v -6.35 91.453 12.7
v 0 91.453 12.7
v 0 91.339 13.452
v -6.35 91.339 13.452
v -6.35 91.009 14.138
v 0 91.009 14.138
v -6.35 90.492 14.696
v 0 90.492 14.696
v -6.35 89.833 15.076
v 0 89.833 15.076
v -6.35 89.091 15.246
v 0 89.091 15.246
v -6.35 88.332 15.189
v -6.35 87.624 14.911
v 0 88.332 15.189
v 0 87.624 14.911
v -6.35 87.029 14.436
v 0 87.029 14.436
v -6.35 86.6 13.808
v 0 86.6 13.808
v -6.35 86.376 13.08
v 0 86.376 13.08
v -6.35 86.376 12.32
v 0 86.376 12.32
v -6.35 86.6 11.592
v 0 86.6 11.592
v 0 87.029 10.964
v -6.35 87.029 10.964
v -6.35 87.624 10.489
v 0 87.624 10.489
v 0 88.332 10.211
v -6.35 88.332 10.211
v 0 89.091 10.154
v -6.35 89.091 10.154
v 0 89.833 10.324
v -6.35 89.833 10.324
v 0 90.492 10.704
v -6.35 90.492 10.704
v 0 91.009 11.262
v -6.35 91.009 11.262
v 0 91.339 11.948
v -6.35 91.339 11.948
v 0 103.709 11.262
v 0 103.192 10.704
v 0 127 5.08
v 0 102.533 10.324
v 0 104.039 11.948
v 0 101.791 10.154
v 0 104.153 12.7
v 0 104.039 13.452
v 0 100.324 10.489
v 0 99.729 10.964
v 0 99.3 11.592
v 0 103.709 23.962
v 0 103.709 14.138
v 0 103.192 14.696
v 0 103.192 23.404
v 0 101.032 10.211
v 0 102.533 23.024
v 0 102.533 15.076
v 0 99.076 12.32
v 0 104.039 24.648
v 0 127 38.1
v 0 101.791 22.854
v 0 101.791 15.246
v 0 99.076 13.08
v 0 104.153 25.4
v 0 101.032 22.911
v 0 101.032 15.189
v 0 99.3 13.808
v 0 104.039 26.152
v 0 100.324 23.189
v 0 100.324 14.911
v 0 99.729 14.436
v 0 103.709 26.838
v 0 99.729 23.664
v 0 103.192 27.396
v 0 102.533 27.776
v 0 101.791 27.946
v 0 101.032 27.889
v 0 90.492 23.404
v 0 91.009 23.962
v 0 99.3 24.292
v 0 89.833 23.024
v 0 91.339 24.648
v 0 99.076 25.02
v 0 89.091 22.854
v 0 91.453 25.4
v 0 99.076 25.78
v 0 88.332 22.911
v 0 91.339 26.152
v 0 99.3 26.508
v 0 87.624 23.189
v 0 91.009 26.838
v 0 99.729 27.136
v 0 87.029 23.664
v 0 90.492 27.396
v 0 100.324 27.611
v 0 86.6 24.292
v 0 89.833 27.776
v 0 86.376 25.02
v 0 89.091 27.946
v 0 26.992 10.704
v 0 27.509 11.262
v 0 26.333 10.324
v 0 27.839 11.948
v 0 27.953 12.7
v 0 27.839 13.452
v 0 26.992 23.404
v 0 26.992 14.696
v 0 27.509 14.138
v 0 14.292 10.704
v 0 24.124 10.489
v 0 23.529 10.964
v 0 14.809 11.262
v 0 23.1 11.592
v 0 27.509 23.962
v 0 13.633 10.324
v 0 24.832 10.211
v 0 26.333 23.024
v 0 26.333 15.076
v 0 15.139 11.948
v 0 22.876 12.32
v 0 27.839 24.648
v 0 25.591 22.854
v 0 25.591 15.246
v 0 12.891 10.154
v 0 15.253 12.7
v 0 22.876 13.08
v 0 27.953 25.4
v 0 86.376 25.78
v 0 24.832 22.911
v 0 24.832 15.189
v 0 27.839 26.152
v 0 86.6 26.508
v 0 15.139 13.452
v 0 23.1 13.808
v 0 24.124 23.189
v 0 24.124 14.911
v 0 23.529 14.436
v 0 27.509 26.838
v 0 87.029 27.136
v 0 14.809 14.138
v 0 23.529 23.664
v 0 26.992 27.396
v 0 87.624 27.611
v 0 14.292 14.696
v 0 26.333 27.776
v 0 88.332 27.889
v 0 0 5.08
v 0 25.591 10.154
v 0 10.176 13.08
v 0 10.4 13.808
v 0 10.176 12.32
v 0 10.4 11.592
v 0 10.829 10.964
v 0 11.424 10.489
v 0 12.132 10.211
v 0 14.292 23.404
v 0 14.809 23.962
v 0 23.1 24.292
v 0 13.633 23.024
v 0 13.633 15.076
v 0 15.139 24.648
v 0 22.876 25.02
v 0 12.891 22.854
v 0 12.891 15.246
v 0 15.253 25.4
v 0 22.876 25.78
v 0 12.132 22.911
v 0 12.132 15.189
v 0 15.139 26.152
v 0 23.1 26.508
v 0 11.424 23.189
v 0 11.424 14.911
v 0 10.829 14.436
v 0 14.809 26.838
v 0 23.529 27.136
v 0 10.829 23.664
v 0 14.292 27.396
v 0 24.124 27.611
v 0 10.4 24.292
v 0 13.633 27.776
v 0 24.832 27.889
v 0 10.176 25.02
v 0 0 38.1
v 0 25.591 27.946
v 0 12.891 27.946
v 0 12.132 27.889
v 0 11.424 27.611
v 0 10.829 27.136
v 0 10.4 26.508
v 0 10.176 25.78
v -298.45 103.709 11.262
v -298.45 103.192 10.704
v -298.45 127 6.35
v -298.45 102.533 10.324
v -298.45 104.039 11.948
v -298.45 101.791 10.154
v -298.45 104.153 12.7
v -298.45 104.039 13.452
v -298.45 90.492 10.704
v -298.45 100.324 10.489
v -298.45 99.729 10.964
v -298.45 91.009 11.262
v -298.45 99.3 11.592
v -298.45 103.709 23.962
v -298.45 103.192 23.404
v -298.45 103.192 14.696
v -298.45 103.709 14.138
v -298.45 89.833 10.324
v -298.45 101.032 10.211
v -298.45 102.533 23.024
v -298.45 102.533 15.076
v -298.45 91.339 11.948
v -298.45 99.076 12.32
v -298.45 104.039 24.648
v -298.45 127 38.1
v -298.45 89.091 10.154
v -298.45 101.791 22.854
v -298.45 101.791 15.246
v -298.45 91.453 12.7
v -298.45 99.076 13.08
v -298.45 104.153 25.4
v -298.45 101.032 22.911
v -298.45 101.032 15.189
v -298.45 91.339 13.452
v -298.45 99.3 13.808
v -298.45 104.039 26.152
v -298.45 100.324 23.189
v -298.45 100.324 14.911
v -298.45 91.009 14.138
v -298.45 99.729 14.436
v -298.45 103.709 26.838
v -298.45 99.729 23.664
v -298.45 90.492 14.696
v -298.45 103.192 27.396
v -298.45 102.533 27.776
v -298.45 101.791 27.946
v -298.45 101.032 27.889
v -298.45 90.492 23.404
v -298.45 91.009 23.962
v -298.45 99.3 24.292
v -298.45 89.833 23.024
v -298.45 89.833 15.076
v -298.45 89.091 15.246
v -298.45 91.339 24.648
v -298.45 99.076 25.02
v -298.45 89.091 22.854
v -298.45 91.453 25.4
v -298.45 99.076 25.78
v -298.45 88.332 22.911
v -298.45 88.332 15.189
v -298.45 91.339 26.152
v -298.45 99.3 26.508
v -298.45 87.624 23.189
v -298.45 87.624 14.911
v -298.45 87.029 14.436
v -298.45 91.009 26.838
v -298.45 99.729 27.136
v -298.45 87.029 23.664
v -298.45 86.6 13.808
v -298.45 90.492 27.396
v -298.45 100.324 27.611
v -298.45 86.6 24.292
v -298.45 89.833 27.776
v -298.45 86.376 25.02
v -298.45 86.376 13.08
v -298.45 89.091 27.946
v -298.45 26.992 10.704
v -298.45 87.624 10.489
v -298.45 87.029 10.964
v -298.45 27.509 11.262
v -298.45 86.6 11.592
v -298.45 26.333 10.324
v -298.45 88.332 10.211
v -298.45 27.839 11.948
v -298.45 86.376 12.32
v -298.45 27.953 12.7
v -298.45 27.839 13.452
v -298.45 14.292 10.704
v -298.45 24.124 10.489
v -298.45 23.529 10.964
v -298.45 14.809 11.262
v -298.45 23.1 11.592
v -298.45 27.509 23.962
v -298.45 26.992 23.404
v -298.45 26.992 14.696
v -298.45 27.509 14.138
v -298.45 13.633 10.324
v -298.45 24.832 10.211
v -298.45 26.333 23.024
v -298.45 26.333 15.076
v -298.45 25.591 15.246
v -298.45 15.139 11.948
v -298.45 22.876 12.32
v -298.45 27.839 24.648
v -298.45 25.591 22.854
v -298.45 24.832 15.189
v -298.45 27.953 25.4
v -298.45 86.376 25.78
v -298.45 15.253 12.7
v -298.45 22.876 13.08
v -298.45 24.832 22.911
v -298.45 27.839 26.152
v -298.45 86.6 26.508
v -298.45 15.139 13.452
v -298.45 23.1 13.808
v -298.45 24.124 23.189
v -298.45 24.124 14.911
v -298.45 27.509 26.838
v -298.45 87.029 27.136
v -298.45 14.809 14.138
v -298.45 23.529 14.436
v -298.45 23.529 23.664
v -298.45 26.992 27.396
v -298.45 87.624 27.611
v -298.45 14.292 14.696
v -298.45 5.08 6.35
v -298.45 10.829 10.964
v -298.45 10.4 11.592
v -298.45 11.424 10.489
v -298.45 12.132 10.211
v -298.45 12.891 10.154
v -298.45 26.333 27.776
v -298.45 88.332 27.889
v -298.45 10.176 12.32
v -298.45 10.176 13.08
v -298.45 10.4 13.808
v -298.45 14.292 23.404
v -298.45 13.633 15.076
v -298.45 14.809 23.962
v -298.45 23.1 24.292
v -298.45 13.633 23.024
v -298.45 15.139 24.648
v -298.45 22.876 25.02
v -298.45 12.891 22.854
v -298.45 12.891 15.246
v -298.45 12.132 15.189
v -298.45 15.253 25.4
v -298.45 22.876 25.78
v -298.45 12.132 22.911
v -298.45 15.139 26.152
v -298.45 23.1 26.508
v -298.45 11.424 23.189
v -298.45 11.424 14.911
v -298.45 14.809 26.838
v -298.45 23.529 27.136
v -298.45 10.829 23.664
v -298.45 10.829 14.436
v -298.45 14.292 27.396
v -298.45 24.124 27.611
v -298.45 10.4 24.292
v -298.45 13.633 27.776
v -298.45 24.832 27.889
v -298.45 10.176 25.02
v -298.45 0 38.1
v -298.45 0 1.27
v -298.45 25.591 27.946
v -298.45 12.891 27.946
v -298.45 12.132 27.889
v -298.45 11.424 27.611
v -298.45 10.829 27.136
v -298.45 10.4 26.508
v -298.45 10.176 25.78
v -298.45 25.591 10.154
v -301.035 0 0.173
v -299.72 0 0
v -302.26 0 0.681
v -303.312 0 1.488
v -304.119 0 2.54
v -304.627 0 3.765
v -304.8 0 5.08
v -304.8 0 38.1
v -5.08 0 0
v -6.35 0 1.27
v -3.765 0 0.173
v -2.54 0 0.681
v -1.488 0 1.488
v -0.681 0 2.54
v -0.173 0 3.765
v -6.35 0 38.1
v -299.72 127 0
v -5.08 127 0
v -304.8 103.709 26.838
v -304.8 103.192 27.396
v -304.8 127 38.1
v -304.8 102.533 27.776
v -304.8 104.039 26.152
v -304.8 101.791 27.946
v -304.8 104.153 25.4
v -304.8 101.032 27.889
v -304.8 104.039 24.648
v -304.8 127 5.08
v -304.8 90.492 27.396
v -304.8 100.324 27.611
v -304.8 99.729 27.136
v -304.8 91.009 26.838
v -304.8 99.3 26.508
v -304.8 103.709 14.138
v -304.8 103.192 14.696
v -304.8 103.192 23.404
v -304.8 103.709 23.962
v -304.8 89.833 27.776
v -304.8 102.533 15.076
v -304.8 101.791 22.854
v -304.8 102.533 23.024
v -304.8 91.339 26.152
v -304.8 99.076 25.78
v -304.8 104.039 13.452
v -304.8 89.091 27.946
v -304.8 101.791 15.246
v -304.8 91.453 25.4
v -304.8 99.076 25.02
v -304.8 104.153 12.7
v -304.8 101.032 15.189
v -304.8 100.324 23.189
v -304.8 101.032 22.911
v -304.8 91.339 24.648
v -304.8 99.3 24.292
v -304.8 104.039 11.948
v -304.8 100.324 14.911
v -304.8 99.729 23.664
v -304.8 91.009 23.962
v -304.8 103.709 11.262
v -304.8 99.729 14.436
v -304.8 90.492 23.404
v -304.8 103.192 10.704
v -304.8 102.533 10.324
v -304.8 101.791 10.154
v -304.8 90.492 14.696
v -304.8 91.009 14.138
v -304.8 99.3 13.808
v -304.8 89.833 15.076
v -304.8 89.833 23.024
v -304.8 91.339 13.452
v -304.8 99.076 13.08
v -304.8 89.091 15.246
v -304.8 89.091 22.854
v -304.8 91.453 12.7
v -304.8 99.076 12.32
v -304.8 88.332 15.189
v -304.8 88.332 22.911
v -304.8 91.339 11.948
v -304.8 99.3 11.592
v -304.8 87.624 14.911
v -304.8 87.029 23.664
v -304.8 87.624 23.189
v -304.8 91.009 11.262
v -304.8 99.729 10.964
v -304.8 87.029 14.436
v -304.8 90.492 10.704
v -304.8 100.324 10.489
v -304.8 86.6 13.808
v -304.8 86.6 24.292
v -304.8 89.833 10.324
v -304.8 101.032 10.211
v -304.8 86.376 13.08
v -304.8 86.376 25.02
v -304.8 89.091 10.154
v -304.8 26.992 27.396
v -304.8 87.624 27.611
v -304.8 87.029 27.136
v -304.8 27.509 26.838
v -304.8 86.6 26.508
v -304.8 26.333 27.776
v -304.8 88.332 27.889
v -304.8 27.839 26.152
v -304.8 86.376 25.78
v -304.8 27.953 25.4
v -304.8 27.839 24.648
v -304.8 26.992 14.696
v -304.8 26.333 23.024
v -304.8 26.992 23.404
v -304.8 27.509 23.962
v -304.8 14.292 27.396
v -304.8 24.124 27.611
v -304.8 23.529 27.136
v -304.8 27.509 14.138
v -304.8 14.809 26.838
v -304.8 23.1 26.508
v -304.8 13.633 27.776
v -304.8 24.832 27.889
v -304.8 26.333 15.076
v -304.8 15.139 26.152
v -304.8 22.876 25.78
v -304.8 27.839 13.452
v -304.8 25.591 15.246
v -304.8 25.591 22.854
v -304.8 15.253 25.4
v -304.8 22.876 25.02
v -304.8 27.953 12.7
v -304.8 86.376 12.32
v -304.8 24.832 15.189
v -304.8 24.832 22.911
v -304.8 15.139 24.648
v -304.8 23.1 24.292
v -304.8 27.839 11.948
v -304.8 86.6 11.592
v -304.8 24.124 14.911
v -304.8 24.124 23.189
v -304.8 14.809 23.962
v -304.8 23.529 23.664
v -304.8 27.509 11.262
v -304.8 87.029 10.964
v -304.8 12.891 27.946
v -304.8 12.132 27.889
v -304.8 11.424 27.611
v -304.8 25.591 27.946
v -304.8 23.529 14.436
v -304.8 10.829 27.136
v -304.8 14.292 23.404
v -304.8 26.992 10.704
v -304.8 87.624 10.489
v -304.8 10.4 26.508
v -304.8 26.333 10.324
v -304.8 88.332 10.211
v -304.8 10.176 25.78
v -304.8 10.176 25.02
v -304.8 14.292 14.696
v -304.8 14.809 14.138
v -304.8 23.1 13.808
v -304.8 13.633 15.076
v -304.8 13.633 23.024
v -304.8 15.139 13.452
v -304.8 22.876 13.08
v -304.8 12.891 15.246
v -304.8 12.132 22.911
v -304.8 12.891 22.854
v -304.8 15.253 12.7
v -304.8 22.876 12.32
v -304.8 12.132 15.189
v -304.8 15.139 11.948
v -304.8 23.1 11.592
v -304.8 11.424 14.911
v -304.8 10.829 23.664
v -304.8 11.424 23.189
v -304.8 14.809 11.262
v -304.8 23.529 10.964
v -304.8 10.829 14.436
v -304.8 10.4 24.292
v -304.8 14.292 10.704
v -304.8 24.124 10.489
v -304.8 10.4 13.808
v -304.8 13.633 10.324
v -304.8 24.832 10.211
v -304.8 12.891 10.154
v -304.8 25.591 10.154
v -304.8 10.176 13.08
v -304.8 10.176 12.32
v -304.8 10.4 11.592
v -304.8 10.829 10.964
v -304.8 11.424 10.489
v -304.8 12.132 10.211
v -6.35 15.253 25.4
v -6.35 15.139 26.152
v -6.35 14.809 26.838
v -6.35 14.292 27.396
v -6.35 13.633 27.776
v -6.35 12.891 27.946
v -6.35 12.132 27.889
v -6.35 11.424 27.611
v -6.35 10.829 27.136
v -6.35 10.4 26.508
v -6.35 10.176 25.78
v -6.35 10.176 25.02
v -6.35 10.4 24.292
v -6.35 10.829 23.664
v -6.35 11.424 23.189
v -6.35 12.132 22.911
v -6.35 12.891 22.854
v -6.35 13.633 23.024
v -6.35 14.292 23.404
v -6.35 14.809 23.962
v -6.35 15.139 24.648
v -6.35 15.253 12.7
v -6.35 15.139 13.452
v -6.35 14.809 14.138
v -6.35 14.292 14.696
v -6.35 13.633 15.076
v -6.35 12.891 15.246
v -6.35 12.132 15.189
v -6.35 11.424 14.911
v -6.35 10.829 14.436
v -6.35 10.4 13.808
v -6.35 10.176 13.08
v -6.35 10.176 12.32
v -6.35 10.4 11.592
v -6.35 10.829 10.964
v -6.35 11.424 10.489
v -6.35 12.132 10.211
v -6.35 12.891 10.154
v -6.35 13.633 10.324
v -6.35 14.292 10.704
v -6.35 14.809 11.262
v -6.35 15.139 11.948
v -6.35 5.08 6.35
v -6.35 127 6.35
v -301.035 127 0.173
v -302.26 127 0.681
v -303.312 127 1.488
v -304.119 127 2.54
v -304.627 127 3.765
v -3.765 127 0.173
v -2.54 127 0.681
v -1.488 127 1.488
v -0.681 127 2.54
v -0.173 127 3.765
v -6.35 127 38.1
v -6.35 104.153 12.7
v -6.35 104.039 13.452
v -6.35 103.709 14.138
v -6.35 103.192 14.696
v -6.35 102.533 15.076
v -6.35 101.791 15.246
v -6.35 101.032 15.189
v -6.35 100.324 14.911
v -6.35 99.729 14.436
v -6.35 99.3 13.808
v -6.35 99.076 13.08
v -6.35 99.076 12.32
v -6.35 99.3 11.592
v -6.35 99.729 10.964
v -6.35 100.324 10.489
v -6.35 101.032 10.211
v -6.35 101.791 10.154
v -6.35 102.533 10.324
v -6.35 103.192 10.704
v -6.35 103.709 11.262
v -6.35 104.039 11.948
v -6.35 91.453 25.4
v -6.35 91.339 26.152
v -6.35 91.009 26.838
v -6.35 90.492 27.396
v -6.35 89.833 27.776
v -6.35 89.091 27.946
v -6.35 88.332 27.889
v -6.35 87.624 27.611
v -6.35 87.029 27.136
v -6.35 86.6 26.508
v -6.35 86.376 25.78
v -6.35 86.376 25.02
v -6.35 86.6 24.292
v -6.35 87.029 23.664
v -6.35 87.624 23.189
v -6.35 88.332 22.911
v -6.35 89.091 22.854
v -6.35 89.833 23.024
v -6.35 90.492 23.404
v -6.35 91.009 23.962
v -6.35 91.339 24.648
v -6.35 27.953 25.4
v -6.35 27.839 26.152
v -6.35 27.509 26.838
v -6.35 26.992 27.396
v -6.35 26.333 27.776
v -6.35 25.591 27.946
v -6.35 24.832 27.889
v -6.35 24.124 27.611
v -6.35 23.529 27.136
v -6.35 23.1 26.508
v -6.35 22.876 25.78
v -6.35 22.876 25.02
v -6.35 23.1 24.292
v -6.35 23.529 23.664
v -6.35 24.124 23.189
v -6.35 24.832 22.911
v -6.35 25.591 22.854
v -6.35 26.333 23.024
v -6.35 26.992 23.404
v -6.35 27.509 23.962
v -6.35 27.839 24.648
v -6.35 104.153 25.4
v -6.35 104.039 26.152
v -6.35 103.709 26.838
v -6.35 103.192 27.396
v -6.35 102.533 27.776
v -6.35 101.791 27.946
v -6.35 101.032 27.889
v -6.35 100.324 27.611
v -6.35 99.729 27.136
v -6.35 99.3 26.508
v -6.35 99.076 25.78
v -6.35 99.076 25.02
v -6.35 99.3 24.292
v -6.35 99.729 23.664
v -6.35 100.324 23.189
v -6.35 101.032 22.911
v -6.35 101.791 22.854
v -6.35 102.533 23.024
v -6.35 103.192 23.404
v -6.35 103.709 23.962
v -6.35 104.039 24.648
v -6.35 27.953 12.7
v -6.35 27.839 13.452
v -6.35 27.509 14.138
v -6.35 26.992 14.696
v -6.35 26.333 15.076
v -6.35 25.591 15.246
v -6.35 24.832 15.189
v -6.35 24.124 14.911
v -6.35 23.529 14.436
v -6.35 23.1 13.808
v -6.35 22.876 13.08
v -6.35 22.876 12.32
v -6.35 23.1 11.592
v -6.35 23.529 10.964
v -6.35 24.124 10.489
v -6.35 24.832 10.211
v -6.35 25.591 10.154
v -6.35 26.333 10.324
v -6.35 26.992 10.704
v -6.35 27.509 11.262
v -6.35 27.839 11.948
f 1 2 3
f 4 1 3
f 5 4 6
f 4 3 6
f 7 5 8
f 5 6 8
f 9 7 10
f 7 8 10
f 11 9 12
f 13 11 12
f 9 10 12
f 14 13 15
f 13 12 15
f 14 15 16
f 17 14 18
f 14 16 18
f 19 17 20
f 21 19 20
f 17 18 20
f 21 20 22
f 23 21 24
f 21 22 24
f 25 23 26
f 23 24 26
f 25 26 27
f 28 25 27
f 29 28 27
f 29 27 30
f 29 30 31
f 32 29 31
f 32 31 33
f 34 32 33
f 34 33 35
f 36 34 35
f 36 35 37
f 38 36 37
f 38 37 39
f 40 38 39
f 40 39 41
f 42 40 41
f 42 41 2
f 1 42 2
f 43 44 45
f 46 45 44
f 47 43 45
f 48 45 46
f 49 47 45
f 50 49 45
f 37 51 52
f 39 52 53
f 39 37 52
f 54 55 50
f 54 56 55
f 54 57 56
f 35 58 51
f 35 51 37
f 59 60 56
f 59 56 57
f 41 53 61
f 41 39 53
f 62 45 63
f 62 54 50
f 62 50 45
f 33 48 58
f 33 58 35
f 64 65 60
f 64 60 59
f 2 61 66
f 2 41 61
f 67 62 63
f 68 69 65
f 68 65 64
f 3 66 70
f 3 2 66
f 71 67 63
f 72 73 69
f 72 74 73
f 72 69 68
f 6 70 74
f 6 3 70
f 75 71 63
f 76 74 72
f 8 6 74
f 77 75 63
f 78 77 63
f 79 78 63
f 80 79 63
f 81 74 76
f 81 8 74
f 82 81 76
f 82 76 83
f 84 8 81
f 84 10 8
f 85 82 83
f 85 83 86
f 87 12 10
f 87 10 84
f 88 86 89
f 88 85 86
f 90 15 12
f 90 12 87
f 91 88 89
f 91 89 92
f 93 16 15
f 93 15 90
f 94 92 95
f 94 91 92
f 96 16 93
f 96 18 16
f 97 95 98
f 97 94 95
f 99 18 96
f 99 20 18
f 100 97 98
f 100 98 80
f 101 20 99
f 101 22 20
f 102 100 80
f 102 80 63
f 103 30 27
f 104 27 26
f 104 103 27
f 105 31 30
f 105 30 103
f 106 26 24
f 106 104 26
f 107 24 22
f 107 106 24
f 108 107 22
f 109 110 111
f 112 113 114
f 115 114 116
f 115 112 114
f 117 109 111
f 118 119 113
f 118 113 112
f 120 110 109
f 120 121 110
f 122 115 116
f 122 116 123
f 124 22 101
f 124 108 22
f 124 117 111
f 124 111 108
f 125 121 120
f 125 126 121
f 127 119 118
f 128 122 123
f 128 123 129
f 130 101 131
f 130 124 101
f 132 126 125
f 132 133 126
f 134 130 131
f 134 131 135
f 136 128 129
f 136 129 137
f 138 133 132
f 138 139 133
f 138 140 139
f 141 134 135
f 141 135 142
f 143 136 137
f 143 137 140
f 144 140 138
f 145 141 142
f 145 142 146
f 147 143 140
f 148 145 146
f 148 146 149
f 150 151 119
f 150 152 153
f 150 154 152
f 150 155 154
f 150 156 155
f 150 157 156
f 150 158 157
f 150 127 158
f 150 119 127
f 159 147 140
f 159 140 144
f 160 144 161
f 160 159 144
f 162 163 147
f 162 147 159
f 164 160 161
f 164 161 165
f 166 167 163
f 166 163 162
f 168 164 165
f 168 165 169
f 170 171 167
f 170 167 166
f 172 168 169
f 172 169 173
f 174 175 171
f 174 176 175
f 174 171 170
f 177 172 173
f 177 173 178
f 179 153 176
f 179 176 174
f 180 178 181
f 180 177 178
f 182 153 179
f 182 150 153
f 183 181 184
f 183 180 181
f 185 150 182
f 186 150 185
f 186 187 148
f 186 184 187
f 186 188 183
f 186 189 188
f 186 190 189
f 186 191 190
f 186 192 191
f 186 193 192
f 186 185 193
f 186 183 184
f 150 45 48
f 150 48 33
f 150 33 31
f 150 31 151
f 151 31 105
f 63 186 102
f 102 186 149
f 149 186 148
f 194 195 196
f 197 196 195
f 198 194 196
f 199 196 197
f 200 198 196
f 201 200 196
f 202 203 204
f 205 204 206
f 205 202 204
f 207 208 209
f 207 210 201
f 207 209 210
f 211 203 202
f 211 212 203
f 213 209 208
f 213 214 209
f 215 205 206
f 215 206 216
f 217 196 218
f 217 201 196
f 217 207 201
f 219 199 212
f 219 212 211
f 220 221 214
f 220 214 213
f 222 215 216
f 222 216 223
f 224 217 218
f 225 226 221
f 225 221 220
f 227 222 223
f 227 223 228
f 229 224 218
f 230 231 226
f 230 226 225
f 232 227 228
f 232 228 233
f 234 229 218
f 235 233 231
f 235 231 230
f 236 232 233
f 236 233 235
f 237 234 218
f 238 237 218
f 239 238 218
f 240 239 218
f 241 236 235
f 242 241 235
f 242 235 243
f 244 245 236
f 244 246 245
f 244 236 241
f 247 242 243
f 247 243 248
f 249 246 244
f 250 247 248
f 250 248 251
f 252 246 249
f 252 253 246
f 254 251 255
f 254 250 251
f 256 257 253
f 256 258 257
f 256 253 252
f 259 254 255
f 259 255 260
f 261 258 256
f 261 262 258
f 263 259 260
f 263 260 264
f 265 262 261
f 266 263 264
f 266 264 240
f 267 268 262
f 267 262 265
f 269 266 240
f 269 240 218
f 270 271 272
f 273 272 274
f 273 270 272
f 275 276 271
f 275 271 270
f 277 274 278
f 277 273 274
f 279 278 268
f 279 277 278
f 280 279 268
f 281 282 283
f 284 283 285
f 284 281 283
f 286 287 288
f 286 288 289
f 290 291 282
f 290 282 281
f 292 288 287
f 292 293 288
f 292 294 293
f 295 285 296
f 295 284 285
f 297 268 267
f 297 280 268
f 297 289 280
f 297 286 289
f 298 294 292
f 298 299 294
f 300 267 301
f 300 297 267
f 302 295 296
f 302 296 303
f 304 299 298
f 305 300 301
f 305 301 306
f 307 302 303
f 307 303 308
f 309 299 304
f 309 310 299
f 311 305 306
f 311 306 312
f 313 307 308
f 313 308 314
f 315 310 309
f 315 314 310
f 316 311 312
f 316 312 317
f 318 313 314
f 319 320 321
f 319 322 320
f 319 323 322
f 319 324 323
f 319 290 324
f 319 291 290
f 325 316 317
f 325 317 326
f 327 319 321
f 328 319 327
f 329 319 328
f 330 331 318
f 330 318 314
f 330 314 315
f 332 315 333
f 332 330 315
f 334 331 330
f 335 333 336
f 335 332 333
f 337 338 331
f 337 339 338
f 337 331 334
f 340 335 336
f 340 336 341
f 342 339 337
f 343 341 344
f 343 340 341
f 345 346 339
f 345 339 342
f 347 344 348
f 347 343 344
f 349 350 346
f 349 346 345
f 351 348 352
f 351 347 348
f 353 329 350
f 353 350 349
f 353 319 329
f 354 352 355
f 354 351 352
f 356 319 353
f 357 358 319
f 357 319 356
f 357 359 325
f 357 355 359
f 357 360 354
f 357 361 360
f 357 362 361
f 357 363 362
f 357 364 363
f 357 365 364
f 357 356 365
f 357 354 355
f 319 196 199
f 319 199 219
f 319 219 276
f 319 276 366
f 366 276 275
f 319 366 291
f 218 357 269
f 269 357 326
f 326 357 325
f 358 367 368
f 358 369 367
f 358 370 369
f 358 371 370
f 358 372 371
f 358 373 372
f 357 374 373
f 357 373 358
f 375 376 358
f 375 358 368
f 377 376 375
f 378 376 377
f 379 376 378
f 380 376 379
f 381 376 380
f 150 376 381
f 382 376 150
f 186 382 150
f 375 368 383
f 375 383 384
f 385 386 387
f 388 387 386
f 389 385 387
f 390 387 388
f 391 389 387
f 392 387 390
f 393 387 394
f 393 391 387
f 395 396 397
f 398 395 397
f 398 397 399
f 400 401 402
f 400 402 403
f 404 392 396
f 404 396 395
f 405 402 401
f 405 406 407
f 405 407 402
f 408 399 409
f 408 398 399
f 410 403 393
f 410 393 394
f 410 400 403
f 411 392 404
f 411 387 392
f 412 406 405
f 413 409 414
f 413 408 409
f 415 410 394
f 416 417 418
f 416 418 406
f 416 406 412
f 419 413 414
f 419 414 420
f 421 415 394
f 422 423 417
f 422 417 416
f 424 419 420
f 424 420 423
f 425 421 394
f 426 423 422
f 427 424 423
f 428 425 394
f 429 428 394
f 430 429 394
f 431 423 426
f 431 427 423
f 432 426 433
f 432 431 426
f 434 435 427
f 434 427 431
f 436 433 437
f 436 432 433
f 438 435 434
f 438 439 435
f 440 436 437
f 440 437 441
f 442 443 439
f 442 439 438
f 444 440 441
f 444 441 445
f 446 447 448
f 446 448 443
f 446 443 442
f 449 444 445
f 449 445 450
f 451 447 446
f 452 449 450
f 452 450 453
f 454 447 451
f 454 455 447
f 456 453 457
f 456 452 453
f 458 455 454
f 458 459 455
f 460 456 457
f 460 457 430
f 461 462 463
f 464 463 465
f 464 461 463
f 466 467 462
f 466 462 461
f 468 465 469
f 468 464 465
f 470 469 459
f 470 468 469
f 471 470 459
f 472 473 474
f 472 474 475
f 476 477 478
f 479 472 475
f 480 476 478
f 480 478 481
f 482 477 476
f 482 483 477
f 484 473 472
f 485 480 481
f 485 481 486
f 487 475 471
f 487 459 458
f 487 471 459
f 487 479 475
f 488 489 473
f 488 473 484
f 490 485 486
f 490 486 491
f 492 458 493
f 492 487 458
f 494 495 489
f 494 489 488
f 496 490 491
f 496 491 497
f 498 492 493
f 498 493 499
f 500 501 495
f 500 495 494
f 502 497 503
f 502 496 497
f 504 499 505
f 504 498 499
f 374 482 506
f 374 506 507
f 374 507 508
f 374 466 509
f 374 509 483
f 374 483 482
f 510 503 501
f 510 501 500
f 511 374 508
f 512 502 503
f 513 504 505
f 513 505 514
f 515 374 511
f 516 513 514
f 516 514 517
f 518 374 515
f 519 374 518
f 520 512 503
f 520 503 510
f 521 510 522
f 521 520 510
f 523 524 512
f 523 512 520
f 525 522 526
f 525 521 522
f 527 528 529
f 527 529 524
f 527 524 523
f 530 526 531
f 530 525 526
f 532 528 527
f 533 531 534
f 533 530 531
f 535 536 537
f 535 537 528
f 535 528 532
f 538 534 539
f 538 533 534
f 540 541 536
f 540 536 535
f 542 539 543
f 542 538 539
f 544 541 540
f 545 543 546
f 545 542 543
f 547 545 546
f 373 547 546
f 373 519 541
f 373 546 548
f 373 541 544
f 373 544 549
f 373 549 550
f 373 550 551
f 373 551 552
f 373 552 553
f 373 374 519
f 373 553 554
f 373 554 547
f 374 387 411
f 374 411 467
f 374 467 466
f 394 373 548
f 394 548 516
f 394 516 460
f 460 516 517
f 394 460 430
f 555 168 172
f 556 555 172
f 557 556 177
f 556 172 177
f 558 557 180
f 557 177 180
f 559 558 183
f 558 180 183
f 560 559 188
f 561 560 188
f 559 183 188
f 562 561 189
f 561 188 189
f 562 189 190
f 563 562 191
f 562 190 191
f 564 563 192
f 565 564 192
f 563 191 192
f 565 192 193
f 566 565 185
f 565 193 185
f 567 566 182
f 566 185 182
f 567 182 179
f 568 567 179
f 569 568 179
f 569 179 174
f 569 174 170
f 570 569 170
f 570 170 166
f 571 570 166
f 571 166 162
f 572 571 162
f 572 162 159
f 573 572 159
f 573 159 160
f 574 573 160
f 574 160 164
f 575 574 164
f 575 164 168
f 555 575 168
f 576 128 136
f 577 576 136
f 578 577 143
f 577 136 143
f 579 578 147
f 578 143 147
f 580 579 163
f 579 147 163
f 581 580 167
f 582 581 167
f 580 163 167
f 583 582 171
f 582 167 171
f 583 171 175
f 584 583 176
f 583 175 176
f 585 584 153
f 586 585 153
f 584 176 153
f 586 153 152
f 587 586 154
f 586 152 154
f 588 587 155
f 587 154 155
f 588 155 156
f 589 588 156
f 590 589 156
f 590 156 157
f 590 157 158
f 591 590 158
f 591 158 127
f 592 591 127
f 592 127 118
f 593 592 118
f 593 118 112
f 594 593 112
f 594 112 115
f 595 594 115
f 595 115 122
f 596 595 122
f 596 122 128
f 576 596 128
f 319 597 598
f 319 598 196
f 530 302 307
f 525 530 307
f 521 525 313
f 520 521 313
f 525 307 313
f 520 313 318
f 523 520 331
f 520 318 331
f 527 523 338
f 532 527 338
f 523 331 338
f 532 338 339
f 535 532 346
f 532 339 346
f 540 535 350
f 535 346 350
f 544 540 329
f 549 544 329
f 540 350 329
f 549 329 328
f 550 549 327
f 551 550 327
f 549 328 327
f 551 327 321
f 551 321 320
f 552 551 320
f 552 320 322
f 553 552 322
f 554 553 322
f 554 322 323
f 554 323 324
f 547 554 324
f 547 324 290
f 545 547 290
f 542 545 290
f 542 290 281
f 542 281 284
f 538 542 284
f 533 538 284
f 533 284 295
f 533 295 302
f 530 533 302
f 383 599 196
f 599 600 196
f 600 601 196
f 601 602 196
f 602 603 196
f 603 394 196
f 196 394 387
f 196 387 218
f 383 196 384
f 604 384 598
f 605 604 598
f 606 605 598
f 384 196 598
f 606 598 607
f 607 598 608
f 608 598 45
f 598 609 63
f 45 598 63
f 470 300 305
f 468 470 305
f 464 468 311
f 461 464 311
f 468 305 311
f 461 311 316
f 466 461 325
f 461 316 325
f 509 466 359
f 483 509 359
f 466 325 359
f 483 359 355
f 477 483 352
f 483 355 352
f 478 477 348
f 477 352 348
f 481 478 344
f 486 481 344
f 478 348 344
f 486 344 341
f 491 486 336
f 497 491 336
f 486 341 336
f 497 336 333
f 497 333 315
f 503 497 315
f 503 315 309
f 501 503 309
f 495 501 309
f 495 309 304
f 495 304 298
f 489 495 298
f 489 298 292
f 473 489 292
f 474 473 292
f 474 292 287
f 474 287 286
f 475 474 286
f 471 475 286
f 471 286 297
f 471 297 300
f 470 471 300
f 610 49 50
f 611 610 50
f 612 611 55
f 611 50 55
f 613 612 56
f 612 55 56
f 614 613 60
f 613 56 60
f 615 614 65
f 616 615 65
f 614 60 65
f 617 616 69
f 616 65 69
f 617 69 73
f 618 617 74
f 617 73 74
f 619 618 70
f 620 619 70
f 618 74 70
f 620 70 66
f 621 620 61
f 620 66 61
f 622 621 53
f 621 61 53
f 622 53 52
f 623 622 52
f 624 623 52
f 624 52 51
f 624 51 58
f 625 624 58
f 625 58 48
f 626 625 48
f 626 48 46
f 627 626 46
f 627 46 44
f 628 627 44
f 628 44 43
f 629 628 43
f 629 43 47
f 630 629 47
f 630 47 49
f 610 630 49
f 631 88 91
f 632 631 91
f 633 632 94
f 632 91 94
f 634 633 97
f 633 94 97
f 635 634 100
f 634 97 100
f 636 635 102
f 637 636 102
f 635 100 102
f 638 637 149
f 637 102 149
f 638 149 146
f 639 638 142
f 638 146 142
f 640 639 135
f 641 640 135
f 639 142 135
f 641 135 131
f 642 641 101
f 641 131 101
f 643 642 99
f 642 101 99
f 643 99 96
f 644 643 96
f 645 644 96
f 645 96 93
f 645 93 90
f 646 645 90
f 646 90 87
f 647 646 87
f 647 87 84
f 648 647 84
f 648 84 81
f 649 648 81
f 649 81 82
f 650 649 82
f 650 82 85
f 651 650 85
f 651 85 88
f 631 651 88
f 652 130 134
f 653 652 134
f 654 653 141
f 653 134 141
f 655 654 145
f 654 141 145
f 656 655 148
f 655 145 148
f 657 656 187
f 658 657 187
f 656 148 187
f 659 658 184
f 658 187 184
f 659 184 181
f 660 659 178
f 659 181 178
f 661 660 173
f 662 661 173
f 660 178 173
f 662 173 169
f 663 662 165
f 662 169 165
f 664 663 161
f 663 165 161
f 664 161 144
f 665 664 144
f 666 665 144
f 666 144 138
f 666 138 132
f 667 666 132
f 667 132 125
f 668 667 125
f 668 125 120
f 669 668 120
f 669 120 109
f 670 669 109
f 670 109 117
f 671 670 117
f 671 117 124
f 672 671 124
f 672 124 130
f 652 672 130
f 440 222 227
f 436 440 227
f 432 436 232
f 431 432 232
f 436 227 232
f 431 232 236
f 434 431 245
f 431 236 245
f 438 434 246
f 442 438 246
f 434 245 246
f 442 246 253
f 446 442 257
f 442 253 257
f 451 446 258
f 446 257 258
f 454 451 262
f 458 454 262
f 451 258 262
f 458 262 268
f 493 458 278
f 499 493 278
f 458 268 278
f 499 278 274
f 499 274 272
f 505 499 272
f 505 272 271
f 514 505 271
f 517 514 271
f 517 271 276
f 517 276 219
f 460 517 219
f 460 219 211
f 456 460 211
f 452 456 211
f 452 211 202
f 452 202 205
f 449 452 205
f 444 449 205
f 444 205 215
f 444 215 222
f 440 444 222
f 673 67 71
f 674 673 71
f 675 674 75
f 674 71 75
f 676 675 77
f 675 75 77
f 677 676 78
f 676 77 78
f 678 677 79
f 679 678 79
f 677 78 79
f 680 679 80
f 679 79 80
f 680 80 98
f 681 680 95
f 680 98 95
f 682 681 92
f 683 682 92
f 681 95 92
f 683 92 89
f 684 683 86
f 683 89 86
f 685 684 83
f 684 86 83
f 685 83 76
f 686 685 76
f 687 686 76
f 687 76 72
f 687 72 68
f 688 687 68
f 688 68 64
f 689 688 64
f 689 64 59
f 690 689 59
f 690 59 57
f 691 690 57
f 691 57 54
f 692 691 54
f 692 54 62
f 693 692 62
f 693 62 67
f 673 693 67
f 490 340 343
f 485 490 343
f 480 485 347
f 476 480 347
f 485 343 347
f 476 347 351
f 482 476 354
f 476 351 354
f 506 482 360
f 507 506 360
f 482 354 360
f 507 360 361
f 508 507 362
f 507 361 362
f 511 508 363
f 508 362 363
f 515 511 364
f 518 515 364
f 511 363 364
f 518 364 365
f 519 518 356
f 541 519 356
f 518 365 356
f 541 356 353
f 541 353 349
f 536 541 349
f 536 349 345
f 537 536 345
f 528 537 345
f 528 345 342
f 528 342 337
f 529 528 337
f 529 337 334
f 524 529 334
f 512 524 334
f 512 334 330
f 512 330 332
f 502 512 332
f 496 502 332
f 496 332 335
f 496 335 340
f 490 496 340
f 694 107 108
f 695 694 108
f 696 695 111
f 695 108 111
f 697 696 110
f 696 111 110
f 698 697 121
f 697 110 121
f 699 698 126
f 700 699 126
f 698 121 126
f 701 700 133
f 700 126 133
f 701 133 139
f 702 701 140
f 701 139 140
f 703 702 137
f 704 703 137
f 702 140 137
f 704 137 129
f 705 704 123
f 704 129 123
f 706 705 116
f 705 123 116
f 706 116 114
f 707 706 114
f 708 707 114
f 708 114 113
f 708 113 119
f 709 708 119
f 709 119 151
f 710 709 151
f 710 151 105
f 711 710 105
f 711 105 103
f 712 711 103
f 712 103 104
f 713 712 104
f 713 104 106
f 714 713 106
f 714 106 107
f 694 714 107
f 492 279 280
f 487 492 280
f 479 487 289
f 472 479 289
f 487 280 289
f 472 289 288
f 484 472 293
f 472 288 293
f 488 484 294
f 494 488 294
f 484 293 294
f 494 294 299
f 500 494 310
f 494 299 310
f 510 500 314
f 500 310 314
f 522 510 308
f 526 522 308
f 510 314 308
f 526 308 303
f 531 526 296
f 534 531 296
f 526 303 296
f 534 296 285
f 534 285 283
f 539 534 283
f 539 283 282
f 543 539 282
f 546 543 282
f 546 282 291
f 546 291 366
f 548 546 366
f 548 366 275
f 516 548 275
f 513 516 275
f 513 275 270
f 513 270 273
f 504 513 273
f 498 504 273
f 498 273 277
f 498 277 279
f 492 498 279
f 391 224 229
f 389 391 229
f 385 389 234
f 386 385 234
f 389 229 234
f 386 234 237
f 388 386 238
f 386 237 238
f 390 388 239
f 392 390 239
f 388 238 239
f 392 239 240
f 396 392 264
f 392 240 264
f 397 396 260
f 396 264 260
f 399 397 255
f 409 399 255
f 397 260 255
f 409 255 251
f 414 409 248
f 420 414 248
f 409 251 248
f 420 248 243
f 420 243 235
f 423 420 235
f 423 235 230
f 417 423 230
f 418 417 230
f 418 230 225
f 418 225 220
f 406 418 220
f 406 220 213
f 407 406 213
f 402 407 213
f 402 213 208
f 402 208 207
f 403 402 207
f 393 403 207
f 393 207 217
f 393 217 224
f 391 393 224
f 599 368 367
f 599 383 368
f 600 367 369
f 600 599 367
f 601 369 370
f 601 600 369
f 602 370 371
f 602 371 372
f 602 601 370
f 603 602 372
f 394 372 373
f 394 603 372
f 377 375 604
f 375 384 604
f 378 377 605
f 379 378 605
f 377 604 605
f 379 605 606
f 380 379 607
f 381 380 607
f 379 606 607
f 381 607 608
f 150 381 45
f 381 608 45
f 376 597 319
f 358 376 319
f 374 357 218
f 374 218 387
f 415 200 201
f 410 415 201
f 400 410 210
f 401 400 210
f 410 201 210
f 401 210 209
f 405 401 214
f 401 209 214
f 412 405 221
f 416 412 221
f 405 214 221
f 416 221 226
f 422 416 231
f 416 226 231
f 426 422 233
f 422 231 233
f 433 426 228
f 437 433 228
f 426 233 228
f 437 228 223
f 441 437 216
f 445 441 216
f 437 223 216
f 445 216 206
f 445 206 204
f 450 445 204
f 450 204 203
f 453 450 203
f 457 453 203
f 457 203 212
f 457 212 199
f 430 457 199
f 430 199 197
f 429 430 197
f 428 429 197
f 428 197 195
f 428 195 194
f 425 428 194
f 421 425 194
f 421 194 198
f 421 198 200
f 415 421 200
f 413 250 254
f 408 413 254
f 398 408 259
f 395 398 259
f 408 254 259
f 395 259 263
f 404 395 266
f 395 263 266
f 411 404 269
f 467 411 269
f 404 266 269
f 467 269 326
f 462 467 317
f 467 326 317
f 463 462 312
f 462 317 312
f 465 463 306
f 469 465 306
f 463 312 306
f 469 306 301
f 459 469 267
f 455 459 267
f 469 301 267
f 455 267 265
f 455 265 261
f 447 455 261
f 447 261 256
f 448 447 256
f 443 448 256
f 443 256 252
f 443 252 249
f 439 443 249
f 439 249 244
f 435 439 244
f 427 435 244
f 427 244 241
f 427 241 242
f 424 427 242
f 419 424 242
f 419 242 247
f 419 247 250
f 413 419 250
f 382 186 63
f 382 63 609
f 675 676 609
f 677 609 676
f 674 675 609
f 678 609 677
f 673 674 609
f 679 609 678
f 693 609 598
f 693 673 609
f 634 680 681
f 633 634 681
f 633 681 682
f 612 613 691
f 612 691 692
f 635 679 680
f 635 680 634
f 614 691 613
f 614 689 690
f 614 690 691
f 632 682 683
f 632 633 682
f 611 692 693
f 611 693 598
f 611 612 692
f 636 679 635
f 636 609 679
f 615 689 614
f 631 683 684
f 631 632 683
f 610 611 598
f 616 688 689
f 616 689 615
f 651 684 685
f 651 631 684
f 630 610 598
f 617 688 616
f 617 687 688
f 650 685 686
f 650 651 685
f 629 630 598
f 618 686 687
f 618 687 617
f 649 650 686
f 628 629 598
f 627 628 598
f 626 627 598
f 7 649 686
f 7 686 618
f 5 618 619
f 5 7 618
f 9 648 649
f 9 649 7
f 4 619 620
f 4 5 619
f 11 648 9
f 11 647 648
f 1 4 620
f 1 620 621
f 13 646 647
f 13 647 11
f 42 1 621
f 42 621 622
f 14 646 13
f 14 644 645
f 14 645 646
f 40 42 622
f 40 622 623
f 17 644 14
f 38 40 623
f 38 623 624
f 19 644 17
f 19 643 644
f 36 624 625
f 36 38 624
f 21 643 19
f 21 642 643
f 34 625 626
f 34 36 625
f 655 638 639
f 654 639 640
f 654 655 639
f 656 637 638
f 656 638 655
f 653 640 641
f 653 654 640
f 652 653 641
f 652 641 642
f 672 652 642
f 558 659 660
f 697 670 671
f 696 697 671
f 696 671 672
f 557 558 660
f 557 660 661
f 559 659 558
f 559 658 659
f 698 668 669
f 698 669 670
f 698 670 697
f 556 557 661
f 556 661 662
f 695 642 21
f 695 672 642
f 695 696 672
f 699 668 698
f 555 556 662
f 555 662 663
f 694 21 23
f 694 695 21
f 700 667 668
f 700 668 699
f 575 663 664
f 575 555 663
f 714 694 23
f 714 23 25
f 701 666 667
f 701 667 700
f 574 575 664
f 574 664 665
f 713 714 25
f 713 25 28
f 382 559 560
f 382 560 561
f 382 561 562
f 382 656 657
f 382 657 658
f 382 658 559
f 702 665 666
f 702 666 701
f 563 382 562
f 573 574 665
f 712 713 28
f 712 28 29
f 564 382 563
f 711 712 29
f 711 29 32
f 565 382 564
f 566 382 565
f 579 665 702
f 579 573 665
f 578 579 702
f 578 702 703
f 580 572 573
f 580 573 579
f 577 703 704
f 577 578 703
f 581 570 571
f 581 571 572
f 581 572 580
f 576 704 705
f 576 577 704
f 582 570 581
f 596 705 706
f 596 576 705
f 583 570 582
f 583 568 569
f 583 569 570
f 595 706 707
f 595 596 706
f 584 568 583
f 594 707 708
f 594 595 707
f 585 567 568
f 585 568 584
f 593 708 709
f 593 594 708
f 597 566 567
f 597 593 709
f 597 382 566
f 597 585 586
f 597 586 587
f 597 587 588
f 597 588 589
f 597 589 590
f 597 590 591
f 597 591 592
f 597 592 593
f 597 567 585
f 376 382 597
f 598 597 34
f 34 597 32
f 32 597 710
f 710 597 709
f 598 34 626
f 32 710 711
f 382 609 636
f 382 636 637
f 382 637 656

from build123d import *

# Parameters (mm, degrees)
F1_DEPTH = 127
F2_R     = 5.08
F3_SIZE  = 5.08
F4_R     = 2.5527
F5_DEPTH = 304.801


with BuildPart() as f1:
    # F0 (on Front) → F1 (new body)
    with BuildSketch(Plane.XZ):
        Polygon((-304.8, 0), (0, 0), (0, 38.1), (-6.35, 38.1), (-6.35, 6.35), (-298.45, 6.35), (-298.45, 38.1), (-304.8, 38.1), align=None)
    extrude(amount=-F1_DEPTH)

    # F2
    f2_edges = [f1.edges().sort_by_distance(p)[0] for p in [
        (-304.8, 63.5, 0),
        (0, 63.5, 0),
    ]]
    fillet(f2_edges, radius=F2_R)

    # F3
    f3_edges = [f1.edges().sort_by_distance(p)[0] for p in [
        (-152.4, 0, 6.35),
    ]]
    chamfer(f3_edges, length=F3_SIZE)

    # F4 (on Right) → F5 (cut, through all)
    with BuildSketch(Plane.YZ):
        with Locations((12.7, 12.7)):
            Circle(F4_R)
        with Locations((12.7, 25.4)):
            Circle(F4_R)
        with Locations((25.4, 25.4)):
            Circle(F4_R)
        with Locations((25.4, 12.7)):
            Circle(F4_R)
        with Locations((88.9, 12.7)):
            Circle(F4_R)
        with Locations((101.6, 12.7)):
            Circle(F4_R)
        with Locations((101.6, 25.4)):
            Circle(F4_R)
        with Locations((88.9, 25.4)):
            Circle(F4_R)
    extrude(amount=-F5_DEPTH, mode=Mode.SUBTRACT)


solid = f1.part
